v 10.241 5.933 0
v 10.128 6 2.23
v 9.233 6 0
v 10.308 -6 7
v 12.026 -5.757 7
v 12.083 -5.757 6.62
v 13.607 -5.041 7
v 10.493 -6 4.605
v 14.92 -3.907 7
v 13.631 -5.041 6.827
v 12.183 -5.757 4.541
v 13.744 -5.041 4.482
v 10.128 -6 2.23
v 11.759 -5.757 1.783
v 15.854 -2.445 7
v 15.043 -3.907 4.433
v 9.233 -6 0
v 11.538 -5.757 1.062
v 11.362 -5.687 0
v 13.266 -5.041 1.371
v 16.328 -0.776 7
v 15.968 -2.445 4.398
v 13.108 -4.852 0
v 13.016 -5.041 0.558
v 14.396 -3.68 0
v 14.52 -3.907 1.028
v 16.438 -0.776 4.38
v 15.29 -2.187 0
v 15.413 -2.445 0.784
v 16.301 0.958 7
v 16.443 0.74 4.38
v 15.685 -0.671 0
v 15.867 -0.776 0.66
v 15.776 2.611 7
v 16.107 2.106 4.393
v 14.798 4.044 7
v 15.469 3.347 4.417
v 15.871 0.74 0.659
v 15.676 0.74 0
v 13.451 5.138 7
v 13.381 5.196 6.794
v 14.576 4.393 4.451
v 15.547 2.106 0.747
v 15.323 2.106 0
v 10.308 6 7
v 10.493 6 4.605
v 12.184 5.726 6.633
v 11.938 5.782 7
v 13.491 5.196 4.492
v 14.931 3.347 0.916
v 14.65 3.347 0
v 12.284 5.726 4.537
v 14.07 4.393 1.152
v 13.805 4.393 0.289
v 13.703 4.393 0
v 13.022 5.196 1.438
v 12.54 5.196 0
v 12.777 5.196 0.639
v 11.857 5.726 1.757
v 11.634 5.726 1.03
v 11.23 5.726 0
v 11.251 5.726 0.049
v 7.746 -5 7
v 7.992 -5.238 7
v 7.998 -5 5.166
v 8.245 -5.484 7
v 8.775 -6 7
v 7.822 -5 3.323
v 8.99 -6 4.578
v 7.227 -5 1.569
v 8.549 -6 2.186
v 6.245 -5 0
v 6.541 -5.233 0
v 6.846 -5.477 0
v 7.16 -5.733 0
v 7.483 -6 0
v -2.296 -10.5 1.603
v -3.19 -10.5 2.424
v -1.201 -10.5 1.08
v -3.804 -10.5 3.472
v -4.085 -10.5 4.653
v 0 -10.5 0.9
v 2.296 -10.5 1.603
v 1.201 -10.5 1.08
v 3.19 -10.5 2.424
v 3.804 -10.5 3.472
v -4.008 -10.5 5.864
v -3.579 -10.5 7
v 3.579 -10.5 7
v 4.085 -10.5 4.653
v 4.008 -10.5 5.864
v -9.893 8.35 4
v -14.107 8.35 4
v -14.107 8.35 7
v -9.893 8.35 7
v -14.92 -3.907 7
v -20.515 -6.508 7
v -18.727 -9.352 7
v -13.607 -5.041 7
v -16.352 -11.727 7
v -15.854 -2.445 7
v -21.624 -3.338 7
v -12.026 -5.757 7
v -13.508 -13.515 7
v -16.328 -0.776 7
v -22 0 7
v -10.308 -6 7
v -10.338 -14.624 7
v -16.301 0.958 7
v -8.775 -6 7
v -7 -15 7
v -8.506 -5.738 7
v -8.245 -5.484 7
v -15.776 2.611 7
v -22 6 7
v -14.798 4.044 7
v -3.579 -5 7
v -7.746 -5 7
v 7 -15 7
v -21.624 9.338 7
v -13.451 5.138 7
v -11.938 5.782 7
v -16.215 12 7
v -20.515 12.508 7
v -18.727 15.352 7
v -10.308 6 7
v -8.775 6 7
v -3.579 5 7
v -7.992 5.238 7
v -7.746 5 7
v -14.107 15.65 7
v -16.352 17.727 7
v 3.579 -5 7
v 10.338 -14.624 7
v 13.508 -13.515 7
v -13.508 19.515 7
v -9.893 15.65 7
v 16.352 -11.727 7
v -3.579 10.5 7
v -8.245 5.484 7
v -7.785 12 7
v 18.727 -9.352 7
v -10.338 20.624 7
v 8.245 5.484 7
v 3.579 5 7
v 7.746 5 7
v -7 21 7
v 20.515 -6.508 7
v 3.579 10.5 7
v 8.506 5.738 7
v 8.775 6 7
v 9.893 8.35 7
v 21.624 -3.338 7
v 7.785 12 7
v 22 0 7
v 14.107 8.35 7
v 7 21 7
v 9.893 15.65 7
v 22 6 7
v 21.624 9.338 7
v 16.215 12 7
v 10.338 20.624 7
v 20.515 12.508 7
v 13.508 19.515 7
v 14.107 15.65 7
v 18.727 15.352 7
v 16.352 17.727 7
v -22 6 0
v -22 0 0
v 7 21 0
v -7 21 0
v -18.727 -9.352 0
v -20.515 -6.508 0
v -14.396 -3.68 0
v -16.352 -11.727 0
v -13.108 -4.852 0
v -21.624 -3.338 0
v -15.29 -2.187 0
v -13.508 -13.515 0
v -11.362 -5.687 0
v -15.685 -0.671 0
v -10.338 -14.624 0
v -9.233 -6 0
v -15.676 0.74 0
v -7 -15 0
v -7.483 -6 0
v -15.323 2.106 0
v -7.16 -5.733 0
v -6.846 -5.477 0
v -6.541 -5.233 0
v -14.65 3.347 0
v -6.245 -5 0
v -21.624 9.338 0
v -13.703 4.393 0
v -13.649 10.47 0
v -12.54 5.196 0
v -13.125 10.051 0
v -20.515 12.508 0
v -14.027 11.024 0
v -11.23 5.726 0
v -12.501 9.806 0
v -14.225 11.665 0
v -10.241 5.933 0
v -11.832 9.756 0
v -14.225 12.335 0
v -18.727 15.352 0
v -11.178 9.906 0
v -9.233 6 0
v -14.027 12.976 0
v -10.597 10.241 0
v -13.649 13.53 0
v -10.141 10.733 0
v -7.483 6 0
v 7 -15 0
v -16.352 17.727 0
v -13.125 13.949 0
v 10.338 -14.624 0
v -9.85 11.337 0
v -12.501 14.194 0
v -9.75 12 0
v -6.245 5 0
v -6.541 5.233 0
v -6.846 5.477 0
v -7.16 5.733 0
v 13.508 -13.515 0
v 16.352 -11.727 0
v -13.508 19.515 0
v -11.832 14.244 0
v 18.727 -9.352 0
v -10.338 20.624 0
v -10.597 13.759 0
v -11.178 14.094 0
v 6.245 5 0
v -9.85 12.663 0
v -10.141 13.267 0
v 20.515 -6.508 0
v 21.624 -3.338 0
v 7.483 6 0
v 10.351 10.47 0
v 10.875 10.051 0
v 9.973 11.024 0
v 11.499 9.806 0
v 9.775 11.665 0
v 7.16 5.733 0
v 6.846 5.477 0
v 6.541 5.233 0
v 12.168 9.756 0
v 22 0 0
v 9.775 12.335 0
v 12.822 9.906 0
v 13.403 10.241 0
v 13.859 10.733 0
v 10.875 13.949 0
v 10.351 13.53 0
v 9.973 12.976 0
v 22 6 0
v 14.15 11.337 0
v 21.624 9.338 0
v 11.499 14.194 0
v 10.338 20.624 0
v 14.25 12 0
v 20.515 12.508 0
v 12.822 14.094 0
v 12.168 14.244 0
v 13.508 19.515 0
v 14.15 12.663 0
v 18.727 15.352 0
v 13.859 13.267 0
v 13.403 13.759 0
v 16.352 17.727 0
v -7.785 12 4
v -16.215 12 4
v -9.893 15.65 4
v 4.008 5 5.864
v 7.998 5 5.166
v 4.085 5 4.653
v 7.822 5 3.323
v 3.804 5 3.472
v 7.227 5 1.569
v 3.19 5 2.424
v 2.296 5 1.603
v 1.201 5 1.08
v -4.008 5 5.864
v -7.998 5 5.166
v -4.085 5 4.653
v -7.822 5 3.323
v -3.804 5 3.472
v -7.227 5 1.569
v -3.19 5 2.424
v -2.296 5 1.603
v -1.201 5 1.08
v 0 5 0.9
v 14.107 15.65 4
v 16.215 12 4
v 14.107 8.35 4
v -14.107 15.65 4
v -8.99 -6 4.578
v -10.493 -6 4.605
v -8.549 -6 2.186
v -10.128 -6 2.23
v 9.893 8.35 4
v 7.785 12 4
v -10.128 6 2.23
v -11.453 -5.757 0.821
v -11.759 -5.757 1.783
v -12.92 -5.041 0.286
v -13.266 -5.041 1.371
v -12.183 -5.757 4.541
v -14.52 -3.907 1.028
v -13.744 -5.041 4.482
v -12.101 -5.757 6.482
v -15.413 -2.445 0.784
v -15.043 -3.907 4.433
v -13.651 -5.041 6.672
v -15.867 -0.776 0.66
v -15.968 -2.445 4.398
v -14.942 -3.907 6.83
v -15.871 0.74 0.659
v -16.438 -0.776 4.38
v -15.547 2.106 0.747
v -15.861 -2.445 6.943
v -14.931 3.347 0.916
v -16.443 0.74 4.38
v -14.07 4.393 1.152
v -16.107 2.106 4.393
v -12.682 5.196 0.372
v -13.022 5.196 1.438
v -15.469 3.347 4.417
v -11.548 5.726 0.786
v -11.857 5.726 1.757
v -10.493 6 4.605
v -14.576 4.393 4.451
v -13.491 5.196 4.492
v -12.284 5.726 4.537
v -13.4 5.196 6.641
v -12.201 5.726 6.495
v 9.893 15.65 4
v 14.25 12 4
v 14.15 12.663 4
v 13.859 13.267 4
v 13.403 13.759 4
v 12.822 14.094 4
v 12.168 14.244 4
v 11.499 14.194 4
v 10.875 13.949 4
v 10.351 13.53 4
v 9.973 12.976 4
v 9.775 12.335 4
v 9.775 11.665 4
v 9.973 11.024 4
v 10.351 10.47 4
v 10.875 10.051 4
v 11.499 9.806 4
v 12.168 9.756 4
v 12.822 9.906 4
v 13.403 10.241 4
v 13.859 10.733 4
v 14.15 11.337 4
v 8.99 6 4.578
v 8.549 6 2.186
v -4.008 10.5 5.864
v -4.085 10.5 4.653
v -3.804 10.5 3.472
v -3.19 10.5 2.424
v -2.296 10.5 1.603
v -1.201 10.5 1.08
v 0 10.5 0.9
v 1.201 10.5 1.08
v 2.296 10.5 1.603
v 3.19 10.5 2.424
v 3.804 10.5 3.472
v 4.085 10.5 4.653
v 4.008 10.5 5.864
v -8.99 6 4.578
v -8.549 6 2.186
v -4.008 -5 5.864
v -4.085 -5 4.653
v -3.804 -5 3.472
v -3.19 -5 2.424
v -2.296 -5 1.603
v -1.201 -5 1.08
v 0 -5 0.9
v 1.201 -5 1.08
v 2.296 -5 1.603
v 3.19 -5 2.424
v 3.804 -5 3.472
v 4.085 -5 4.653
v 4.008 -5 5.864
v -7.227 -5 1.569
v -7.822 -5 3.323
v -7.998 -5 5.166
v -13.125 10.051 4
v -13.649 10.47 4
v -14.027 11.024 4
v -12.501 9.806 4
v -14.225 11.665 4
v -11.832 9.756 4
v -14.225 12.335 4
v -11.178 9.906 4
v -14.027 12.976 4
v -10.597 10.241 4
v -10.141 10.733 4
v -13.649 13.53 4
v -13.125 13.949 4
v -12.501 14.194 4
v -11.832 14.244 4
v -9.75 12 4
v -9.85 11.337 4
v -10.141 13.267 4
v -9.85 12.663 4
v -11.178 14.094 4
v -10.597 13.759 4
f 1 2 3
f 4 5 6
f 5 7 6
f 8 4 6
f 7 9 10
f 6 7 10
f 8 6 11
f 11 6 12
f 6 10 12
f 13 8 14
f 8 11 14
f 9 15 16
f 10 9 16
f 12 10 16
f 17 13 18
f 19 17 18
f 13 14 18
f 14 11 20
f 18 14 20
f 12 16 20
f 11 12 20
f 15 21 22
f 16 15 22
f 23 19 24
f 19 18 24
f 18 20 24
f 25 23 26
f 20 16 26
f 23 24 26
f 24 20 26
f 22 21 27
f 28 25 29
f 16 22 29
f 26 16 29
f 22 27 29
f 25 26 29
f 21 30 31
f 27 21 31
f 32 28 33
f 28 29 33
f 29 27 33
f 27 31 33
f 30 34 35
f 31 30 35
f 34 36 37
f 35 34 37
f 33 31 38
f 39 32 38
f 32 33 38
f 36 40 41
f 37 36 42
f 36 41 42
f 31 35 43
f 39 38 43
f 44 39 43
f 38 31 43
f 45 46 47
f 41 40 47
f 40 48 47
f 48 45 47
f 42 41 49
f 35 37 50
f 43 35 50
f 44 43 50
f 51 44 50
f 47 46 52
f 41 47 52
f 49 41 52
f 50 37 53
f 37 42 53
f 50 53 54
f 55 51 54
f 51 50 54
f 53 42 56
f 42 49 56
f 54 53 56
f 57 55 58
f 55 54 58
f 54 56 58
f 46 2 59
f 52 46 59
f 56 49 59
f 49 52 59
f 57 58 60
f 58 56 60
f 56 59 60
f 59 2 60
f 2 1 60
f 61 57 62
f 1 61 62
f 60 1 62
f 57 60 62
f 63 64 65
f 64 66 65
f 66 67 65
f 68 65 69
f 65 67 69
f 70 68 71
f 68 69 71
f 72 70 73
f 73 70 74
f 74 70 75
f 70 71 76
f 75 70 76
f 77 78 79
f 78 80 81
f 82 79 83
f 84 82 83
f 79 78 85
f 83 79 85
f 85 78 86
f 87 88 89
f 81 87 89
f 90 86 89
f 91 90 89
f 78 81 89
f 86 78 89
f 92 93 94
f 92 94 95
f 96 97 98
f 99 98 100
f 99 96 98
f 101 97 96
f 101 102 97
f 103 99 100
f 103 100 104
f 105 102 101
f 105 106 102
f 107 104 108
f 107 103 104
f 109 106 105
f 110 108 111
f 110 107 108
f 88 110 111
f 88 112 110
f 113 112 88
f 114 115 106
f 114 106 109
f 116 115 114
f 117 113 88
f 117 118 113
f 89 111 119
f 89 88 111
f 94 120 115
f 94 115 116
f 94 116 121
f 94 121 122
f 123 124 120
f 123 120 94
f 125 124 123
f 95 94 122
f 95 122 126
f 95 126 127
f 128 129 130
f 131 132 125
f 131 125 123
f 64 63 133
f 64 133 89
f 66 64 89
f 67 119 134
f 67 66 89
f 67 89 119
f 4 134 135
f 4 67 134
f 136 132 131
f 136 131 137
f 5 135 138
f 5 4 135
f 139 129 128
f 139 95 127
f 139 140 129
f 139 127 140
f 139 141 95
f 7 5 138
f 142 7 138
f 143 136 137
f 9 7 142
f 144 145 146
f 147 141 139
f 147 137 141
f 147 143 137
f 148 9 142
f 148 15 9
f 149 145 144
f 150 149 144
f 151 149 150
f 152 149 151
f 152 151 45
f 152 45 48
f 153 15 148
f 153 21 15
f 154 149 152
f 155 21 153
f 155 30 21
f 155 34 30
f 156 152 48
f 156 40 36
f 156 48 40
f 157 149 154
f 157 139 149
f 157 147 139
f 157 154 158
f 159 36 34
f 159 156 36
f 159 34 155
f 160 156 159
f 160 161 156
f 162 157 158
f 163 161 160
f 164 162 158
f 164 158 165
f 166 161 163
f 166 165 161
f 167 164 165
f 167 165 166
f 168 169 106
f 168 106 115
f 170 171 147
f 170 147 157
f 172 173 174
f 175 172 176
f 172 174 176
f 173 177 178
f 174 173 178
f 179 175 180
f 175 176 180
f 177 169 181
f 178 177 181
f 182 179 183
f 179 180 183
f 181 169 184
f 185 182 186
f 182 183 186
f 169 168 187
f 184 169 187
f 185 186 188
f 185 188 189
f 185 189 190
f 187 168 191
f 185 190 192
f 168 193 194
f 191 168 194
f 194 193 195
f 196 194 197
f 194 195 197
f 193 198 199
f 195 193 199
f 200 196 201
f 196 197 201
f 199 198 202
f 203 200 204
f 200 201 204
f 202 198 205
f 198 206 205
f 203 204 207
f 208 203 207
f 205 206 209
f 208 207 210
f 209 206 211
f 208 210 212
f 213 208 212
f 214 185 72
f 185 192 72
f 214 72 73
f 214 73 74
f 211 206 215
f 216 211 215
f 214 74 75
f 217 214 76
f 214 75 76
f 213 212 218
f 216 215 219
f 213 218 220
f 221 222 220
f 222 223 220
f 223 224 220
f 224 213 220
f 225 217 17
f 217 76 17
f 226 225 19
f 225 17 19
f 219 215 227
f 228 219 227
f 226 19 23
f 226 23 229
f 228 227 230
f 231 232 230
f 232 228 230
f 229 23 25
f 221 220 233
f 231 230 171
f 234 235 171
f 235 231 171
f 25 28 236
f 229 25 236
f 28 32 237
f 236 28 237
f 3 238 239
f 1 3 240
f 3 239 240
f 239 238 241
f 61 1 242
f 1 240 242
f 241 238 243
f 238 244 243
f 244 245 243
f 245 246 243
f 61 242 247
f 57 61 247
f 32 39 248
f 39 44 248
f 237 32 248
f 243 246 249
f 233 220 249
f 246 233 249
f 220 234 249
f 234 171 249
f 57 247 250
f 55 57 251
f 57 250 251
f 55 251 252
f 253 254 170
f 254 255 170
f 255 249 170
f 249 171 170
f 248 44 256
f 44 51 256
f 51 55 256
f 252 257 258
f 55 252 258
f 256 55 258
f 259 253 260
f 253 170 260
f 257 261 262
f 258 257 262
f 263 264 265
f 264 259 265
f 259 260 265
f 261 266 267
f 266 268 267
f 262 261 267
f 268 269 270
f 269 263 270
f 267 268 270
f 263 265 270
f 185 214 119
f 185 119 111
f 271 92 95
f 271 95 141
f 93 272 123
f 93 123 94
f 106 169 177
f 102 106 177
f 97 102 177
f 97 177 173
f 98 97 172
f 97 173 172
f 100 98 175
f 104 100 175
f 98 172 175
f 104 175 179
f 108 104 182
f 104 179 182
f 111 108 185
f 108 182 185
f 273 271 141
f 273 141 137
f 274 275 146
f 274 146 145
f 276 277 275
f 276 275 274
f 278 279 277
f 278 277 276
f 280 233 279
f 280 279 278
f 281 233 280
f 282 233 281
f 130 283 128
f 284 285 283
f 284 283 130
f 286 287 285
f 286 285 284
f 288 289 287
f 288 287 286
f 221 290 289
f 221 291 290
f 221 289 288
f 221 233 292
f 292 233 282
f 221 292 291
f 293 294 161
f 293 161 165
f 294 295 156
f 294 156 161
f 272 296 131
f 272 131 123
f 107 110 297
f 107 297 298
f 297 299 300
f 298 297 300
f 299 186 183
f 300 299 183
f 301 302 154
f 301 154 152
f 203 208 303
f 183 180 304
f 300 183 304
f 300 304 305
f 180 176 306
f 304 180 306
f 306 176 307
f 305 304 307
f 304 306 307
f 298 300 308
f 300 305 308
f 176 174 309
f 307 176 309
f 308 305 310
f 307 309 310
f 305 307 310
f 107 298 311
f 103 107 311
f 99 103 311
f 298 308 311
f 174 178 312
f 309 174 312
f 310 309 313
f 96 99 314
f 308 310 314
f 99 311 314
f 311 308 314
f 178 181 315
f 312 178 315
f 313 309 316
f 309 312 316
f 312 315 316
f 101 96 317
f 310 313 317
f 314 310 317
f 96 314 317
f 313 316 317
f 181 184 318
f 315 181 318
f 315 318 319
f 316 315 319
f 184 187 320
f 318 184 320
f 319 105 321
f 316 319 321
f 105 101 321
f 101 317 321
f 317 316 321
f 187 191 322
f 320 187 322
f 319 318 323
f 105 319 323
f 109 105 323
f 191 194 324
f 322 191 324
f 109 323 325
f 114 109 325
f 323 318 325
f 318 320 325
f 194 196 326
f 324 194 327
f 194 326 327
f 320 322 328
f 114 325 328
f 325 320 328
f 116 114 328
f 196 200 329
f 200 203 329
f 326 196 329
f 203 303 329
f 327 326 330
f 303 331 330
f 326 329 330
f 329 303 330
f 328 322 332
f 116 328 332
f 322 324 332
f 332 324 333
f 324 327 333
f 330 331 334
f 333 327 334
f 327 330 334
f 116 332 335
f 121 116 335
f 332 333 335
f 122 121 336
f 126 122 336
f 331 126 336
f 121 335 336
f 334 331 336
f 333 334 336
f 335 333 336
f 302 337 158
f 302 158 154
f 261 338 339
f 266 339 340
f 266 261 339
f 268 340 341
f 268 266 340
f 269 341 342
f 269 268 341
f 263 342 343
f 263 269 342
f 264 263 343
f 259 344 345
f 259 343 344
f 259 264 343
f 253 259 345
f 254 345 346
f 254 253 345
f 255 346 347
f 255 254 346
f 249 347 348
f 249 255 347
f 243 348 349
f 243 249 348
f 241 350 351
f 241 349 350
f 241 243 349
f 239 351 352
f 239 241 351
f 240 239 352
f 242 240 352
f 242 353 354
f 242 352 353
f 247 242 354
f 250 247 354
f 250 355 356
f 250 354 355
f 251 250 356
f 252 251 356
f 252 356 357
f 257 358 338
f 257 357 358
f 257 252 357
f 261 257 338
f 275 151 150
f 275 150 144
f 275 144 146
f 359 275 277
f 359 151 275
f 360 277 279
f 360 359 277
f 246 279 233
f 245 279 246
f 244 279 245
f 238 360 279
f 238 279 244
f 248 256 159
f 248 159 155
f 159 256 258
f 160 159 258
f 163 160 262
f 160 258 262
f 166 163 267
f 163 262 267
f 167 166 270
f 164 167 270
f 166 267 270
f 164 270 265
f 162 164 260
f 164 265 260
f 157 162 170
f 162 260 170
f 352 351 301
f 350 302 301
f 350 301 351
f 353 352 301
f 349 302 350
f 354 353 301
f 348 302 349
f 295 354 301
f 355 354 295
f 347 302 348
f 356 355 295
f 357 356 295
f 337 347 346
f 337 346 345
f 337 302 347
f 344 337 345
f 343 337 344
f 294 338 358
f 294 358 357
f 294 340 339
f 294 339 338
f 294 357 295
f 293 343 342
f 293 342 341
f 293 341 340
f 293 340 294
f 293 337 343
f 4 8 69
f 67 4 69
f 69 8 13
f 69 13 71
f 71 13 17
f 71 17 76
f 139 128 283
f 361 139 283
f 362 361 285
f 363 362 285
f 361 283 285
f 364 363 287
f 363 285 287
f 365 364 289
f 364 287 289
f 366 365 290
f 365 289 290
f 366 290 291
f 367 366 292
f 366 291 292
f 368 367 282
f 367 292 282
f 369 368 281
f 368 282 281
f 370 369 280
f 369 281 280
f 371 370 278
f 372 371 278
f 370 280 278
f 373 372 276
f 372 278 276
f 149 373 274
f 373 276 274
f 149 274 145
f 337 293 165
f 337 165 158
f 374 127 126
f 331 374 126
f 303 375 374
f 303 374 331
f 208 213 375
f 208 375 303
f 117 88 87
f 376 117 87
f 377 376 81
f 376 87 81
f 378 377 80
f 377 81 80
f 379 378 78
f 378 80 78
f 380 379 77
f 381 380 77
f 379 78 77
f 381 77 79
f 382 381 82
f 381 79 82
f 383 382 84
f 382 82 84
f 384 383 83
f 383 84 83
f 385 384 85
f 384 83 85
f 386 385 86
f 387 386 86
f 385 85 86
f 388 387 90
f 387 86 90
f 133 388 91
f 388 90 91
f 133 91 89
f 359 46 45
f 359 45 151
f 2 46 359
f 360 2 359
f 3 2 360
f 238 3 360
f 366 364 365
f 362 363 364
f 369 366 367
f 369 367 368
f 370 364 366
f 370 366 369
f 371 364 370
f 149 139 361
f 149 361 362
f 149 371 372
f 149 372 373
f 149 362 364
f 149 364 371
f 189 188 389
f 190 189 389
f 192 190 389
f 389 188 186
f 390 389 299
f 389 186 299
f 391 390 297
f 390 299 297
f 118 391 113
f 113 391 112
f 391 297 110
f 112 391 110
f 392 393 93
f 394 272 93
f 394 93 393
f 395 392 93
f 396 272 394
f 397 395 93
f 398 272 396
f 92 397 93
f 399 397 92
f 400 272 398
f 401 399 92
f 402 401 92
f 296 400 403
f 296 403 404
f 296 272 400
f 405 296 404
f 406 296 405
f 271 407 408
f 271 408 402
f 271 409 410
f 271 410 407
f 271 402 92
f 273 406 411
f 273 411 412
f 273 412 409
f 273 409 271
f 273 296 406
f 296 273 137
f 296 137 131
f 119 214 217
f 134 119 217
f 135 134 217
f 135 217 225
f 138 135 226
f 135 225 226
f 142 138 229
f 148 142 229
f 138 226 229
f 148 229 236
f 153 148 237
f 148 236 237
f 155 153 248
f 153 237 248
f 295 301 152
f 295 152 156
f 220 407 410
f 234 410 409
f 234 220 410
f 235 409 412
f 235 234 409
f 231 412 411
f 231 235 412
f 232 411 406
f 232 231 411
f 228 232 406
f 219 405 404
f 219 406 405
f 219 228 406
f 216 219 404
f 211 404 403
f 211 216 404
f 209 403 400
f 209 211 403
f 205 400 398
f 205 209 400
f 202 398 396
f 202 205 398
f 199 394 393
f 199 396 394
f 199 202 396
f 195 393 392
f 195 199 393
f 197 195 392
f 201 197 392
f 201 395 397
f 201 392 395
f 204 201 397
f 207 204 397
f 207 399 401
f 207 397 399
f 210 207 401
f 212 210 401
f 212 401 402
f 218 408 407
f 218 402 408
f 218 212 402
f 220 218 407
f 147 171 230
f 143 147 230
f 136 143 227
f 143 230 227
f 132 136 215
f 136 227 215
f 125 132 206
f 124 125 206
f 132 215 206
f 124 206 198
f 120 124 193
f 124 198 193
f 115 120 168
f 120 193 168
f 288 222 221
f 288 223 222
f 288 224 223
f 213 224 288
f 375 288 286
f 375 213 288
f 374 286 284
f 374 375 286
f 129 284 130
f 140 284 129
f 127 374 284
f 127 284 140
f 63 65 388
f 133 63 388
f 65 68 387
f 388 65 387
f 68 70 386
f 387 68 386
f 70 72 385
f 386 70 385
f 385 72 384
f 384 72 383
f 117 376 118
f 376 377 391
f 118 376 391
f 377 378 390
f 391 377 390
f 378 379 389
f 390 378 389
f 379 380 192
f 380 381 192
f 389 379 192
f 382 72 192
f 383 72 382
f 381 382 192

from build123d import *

# Parameters (mm, degrees)
PAD_DEPTH       = 7
SKETCH002_R     = 4.1
POCKET001_DEPTH = 10.5
SKETCH003_R     = 2.25
HOLE_DEPTH      = 7.001
POCKET002_DEPTH = 3.001


with BuildPart() as part:
    # Sketch001 → Pad (new body)
    with BuildSketch(Plane.XY):
        with BuildLine():
            ThreePointArc((-7, 21), (-17.606602, 16.606602), (-22, 6))
            Line((-22, 0), (-22, 6))
            ThreePointArc((-22, 0), (-17.606602, -10.606602), (-7, -15))
            Line((7, -15), (-7, -15))
            ThreePointArc((7, -15), (17.606602, -10.606602), (22, 0))
            Line((22, 6), (22, 0))
            ThreePointArc((22, 6), (17.606602, 16.606602), (7, 21))
            Line((-7, 21), (7, 21))
        make_face()
    extrude(amount=PAD_DEPTH)

    # Sketch002 → Pocket001 (cut, symmetric)
    with BuildSketch(Plane.XZ):
        with Locations((0, 5)):
            Circle(SKETCH002_R)
    extrude(amount=POCKET001_DEPTH, both=True, mode=Mode.SUBTRACT)

    # Sketch003 → Hole (cut, through all)
    with BuildSketch(Plane(origin=(12, 12, 0), x_dir=(1, 0, 0), z_dir=(0, 0, 1))):
        Circle(SKETCH003_R)
        with Locations((-24, 0)):
            Circle(SKETCH003_R)
    extrude(amount=HOLE_DEPTH, mode=Mode.SUBTRACT)

    # Sketch004 (on Sketch) → Pocket002 (cut, through all)
    with BuildSketch(Plane(origin=(12, 12, 4), x_dir=(1, 0, 0), z_dir=(0, 0, 1))):
        Polygon((4.214657, 0), (2.107328, 3.65), (-2.107328, 3.65), (-4.214657, 0), (-2.107328, -3.65), (2.107328, -3.65), align=None)
        Polygon((-19.785343, 0), (-21.892672, 3.65), (-26.107328, 3.65), (-28.214657, 0), (-26.107328, -3.65), (-21.892672, -3.65), align=None)
    extrude(amount=POCKET002_DEPTH, mode=Mode.SUBTRACT)

    # Sketch → Groove (revolve, cut)
    with BuildSketch(Plane.XY.offset(5)):
        with BuildLine():
            ThreePointArc((10.5, -6), (16.5, 0), (10.5, 6))
            Line((9, 6), (10.5, 6))
            Line((8, 5), (9, 6))
            Line((0, 5), (8, 5))
            Line((0, 5), (0, -5))
            Line((0, -5), (8, -5))
            Line((8, -5), (9, -6))
            Line((9, -6), (10.5, -6))
        make_face()
    revolve(axis=Axis((0, 0, 5), (0, 1, 0)), mode=Mode.SUBTRACT)


solid = part.part
